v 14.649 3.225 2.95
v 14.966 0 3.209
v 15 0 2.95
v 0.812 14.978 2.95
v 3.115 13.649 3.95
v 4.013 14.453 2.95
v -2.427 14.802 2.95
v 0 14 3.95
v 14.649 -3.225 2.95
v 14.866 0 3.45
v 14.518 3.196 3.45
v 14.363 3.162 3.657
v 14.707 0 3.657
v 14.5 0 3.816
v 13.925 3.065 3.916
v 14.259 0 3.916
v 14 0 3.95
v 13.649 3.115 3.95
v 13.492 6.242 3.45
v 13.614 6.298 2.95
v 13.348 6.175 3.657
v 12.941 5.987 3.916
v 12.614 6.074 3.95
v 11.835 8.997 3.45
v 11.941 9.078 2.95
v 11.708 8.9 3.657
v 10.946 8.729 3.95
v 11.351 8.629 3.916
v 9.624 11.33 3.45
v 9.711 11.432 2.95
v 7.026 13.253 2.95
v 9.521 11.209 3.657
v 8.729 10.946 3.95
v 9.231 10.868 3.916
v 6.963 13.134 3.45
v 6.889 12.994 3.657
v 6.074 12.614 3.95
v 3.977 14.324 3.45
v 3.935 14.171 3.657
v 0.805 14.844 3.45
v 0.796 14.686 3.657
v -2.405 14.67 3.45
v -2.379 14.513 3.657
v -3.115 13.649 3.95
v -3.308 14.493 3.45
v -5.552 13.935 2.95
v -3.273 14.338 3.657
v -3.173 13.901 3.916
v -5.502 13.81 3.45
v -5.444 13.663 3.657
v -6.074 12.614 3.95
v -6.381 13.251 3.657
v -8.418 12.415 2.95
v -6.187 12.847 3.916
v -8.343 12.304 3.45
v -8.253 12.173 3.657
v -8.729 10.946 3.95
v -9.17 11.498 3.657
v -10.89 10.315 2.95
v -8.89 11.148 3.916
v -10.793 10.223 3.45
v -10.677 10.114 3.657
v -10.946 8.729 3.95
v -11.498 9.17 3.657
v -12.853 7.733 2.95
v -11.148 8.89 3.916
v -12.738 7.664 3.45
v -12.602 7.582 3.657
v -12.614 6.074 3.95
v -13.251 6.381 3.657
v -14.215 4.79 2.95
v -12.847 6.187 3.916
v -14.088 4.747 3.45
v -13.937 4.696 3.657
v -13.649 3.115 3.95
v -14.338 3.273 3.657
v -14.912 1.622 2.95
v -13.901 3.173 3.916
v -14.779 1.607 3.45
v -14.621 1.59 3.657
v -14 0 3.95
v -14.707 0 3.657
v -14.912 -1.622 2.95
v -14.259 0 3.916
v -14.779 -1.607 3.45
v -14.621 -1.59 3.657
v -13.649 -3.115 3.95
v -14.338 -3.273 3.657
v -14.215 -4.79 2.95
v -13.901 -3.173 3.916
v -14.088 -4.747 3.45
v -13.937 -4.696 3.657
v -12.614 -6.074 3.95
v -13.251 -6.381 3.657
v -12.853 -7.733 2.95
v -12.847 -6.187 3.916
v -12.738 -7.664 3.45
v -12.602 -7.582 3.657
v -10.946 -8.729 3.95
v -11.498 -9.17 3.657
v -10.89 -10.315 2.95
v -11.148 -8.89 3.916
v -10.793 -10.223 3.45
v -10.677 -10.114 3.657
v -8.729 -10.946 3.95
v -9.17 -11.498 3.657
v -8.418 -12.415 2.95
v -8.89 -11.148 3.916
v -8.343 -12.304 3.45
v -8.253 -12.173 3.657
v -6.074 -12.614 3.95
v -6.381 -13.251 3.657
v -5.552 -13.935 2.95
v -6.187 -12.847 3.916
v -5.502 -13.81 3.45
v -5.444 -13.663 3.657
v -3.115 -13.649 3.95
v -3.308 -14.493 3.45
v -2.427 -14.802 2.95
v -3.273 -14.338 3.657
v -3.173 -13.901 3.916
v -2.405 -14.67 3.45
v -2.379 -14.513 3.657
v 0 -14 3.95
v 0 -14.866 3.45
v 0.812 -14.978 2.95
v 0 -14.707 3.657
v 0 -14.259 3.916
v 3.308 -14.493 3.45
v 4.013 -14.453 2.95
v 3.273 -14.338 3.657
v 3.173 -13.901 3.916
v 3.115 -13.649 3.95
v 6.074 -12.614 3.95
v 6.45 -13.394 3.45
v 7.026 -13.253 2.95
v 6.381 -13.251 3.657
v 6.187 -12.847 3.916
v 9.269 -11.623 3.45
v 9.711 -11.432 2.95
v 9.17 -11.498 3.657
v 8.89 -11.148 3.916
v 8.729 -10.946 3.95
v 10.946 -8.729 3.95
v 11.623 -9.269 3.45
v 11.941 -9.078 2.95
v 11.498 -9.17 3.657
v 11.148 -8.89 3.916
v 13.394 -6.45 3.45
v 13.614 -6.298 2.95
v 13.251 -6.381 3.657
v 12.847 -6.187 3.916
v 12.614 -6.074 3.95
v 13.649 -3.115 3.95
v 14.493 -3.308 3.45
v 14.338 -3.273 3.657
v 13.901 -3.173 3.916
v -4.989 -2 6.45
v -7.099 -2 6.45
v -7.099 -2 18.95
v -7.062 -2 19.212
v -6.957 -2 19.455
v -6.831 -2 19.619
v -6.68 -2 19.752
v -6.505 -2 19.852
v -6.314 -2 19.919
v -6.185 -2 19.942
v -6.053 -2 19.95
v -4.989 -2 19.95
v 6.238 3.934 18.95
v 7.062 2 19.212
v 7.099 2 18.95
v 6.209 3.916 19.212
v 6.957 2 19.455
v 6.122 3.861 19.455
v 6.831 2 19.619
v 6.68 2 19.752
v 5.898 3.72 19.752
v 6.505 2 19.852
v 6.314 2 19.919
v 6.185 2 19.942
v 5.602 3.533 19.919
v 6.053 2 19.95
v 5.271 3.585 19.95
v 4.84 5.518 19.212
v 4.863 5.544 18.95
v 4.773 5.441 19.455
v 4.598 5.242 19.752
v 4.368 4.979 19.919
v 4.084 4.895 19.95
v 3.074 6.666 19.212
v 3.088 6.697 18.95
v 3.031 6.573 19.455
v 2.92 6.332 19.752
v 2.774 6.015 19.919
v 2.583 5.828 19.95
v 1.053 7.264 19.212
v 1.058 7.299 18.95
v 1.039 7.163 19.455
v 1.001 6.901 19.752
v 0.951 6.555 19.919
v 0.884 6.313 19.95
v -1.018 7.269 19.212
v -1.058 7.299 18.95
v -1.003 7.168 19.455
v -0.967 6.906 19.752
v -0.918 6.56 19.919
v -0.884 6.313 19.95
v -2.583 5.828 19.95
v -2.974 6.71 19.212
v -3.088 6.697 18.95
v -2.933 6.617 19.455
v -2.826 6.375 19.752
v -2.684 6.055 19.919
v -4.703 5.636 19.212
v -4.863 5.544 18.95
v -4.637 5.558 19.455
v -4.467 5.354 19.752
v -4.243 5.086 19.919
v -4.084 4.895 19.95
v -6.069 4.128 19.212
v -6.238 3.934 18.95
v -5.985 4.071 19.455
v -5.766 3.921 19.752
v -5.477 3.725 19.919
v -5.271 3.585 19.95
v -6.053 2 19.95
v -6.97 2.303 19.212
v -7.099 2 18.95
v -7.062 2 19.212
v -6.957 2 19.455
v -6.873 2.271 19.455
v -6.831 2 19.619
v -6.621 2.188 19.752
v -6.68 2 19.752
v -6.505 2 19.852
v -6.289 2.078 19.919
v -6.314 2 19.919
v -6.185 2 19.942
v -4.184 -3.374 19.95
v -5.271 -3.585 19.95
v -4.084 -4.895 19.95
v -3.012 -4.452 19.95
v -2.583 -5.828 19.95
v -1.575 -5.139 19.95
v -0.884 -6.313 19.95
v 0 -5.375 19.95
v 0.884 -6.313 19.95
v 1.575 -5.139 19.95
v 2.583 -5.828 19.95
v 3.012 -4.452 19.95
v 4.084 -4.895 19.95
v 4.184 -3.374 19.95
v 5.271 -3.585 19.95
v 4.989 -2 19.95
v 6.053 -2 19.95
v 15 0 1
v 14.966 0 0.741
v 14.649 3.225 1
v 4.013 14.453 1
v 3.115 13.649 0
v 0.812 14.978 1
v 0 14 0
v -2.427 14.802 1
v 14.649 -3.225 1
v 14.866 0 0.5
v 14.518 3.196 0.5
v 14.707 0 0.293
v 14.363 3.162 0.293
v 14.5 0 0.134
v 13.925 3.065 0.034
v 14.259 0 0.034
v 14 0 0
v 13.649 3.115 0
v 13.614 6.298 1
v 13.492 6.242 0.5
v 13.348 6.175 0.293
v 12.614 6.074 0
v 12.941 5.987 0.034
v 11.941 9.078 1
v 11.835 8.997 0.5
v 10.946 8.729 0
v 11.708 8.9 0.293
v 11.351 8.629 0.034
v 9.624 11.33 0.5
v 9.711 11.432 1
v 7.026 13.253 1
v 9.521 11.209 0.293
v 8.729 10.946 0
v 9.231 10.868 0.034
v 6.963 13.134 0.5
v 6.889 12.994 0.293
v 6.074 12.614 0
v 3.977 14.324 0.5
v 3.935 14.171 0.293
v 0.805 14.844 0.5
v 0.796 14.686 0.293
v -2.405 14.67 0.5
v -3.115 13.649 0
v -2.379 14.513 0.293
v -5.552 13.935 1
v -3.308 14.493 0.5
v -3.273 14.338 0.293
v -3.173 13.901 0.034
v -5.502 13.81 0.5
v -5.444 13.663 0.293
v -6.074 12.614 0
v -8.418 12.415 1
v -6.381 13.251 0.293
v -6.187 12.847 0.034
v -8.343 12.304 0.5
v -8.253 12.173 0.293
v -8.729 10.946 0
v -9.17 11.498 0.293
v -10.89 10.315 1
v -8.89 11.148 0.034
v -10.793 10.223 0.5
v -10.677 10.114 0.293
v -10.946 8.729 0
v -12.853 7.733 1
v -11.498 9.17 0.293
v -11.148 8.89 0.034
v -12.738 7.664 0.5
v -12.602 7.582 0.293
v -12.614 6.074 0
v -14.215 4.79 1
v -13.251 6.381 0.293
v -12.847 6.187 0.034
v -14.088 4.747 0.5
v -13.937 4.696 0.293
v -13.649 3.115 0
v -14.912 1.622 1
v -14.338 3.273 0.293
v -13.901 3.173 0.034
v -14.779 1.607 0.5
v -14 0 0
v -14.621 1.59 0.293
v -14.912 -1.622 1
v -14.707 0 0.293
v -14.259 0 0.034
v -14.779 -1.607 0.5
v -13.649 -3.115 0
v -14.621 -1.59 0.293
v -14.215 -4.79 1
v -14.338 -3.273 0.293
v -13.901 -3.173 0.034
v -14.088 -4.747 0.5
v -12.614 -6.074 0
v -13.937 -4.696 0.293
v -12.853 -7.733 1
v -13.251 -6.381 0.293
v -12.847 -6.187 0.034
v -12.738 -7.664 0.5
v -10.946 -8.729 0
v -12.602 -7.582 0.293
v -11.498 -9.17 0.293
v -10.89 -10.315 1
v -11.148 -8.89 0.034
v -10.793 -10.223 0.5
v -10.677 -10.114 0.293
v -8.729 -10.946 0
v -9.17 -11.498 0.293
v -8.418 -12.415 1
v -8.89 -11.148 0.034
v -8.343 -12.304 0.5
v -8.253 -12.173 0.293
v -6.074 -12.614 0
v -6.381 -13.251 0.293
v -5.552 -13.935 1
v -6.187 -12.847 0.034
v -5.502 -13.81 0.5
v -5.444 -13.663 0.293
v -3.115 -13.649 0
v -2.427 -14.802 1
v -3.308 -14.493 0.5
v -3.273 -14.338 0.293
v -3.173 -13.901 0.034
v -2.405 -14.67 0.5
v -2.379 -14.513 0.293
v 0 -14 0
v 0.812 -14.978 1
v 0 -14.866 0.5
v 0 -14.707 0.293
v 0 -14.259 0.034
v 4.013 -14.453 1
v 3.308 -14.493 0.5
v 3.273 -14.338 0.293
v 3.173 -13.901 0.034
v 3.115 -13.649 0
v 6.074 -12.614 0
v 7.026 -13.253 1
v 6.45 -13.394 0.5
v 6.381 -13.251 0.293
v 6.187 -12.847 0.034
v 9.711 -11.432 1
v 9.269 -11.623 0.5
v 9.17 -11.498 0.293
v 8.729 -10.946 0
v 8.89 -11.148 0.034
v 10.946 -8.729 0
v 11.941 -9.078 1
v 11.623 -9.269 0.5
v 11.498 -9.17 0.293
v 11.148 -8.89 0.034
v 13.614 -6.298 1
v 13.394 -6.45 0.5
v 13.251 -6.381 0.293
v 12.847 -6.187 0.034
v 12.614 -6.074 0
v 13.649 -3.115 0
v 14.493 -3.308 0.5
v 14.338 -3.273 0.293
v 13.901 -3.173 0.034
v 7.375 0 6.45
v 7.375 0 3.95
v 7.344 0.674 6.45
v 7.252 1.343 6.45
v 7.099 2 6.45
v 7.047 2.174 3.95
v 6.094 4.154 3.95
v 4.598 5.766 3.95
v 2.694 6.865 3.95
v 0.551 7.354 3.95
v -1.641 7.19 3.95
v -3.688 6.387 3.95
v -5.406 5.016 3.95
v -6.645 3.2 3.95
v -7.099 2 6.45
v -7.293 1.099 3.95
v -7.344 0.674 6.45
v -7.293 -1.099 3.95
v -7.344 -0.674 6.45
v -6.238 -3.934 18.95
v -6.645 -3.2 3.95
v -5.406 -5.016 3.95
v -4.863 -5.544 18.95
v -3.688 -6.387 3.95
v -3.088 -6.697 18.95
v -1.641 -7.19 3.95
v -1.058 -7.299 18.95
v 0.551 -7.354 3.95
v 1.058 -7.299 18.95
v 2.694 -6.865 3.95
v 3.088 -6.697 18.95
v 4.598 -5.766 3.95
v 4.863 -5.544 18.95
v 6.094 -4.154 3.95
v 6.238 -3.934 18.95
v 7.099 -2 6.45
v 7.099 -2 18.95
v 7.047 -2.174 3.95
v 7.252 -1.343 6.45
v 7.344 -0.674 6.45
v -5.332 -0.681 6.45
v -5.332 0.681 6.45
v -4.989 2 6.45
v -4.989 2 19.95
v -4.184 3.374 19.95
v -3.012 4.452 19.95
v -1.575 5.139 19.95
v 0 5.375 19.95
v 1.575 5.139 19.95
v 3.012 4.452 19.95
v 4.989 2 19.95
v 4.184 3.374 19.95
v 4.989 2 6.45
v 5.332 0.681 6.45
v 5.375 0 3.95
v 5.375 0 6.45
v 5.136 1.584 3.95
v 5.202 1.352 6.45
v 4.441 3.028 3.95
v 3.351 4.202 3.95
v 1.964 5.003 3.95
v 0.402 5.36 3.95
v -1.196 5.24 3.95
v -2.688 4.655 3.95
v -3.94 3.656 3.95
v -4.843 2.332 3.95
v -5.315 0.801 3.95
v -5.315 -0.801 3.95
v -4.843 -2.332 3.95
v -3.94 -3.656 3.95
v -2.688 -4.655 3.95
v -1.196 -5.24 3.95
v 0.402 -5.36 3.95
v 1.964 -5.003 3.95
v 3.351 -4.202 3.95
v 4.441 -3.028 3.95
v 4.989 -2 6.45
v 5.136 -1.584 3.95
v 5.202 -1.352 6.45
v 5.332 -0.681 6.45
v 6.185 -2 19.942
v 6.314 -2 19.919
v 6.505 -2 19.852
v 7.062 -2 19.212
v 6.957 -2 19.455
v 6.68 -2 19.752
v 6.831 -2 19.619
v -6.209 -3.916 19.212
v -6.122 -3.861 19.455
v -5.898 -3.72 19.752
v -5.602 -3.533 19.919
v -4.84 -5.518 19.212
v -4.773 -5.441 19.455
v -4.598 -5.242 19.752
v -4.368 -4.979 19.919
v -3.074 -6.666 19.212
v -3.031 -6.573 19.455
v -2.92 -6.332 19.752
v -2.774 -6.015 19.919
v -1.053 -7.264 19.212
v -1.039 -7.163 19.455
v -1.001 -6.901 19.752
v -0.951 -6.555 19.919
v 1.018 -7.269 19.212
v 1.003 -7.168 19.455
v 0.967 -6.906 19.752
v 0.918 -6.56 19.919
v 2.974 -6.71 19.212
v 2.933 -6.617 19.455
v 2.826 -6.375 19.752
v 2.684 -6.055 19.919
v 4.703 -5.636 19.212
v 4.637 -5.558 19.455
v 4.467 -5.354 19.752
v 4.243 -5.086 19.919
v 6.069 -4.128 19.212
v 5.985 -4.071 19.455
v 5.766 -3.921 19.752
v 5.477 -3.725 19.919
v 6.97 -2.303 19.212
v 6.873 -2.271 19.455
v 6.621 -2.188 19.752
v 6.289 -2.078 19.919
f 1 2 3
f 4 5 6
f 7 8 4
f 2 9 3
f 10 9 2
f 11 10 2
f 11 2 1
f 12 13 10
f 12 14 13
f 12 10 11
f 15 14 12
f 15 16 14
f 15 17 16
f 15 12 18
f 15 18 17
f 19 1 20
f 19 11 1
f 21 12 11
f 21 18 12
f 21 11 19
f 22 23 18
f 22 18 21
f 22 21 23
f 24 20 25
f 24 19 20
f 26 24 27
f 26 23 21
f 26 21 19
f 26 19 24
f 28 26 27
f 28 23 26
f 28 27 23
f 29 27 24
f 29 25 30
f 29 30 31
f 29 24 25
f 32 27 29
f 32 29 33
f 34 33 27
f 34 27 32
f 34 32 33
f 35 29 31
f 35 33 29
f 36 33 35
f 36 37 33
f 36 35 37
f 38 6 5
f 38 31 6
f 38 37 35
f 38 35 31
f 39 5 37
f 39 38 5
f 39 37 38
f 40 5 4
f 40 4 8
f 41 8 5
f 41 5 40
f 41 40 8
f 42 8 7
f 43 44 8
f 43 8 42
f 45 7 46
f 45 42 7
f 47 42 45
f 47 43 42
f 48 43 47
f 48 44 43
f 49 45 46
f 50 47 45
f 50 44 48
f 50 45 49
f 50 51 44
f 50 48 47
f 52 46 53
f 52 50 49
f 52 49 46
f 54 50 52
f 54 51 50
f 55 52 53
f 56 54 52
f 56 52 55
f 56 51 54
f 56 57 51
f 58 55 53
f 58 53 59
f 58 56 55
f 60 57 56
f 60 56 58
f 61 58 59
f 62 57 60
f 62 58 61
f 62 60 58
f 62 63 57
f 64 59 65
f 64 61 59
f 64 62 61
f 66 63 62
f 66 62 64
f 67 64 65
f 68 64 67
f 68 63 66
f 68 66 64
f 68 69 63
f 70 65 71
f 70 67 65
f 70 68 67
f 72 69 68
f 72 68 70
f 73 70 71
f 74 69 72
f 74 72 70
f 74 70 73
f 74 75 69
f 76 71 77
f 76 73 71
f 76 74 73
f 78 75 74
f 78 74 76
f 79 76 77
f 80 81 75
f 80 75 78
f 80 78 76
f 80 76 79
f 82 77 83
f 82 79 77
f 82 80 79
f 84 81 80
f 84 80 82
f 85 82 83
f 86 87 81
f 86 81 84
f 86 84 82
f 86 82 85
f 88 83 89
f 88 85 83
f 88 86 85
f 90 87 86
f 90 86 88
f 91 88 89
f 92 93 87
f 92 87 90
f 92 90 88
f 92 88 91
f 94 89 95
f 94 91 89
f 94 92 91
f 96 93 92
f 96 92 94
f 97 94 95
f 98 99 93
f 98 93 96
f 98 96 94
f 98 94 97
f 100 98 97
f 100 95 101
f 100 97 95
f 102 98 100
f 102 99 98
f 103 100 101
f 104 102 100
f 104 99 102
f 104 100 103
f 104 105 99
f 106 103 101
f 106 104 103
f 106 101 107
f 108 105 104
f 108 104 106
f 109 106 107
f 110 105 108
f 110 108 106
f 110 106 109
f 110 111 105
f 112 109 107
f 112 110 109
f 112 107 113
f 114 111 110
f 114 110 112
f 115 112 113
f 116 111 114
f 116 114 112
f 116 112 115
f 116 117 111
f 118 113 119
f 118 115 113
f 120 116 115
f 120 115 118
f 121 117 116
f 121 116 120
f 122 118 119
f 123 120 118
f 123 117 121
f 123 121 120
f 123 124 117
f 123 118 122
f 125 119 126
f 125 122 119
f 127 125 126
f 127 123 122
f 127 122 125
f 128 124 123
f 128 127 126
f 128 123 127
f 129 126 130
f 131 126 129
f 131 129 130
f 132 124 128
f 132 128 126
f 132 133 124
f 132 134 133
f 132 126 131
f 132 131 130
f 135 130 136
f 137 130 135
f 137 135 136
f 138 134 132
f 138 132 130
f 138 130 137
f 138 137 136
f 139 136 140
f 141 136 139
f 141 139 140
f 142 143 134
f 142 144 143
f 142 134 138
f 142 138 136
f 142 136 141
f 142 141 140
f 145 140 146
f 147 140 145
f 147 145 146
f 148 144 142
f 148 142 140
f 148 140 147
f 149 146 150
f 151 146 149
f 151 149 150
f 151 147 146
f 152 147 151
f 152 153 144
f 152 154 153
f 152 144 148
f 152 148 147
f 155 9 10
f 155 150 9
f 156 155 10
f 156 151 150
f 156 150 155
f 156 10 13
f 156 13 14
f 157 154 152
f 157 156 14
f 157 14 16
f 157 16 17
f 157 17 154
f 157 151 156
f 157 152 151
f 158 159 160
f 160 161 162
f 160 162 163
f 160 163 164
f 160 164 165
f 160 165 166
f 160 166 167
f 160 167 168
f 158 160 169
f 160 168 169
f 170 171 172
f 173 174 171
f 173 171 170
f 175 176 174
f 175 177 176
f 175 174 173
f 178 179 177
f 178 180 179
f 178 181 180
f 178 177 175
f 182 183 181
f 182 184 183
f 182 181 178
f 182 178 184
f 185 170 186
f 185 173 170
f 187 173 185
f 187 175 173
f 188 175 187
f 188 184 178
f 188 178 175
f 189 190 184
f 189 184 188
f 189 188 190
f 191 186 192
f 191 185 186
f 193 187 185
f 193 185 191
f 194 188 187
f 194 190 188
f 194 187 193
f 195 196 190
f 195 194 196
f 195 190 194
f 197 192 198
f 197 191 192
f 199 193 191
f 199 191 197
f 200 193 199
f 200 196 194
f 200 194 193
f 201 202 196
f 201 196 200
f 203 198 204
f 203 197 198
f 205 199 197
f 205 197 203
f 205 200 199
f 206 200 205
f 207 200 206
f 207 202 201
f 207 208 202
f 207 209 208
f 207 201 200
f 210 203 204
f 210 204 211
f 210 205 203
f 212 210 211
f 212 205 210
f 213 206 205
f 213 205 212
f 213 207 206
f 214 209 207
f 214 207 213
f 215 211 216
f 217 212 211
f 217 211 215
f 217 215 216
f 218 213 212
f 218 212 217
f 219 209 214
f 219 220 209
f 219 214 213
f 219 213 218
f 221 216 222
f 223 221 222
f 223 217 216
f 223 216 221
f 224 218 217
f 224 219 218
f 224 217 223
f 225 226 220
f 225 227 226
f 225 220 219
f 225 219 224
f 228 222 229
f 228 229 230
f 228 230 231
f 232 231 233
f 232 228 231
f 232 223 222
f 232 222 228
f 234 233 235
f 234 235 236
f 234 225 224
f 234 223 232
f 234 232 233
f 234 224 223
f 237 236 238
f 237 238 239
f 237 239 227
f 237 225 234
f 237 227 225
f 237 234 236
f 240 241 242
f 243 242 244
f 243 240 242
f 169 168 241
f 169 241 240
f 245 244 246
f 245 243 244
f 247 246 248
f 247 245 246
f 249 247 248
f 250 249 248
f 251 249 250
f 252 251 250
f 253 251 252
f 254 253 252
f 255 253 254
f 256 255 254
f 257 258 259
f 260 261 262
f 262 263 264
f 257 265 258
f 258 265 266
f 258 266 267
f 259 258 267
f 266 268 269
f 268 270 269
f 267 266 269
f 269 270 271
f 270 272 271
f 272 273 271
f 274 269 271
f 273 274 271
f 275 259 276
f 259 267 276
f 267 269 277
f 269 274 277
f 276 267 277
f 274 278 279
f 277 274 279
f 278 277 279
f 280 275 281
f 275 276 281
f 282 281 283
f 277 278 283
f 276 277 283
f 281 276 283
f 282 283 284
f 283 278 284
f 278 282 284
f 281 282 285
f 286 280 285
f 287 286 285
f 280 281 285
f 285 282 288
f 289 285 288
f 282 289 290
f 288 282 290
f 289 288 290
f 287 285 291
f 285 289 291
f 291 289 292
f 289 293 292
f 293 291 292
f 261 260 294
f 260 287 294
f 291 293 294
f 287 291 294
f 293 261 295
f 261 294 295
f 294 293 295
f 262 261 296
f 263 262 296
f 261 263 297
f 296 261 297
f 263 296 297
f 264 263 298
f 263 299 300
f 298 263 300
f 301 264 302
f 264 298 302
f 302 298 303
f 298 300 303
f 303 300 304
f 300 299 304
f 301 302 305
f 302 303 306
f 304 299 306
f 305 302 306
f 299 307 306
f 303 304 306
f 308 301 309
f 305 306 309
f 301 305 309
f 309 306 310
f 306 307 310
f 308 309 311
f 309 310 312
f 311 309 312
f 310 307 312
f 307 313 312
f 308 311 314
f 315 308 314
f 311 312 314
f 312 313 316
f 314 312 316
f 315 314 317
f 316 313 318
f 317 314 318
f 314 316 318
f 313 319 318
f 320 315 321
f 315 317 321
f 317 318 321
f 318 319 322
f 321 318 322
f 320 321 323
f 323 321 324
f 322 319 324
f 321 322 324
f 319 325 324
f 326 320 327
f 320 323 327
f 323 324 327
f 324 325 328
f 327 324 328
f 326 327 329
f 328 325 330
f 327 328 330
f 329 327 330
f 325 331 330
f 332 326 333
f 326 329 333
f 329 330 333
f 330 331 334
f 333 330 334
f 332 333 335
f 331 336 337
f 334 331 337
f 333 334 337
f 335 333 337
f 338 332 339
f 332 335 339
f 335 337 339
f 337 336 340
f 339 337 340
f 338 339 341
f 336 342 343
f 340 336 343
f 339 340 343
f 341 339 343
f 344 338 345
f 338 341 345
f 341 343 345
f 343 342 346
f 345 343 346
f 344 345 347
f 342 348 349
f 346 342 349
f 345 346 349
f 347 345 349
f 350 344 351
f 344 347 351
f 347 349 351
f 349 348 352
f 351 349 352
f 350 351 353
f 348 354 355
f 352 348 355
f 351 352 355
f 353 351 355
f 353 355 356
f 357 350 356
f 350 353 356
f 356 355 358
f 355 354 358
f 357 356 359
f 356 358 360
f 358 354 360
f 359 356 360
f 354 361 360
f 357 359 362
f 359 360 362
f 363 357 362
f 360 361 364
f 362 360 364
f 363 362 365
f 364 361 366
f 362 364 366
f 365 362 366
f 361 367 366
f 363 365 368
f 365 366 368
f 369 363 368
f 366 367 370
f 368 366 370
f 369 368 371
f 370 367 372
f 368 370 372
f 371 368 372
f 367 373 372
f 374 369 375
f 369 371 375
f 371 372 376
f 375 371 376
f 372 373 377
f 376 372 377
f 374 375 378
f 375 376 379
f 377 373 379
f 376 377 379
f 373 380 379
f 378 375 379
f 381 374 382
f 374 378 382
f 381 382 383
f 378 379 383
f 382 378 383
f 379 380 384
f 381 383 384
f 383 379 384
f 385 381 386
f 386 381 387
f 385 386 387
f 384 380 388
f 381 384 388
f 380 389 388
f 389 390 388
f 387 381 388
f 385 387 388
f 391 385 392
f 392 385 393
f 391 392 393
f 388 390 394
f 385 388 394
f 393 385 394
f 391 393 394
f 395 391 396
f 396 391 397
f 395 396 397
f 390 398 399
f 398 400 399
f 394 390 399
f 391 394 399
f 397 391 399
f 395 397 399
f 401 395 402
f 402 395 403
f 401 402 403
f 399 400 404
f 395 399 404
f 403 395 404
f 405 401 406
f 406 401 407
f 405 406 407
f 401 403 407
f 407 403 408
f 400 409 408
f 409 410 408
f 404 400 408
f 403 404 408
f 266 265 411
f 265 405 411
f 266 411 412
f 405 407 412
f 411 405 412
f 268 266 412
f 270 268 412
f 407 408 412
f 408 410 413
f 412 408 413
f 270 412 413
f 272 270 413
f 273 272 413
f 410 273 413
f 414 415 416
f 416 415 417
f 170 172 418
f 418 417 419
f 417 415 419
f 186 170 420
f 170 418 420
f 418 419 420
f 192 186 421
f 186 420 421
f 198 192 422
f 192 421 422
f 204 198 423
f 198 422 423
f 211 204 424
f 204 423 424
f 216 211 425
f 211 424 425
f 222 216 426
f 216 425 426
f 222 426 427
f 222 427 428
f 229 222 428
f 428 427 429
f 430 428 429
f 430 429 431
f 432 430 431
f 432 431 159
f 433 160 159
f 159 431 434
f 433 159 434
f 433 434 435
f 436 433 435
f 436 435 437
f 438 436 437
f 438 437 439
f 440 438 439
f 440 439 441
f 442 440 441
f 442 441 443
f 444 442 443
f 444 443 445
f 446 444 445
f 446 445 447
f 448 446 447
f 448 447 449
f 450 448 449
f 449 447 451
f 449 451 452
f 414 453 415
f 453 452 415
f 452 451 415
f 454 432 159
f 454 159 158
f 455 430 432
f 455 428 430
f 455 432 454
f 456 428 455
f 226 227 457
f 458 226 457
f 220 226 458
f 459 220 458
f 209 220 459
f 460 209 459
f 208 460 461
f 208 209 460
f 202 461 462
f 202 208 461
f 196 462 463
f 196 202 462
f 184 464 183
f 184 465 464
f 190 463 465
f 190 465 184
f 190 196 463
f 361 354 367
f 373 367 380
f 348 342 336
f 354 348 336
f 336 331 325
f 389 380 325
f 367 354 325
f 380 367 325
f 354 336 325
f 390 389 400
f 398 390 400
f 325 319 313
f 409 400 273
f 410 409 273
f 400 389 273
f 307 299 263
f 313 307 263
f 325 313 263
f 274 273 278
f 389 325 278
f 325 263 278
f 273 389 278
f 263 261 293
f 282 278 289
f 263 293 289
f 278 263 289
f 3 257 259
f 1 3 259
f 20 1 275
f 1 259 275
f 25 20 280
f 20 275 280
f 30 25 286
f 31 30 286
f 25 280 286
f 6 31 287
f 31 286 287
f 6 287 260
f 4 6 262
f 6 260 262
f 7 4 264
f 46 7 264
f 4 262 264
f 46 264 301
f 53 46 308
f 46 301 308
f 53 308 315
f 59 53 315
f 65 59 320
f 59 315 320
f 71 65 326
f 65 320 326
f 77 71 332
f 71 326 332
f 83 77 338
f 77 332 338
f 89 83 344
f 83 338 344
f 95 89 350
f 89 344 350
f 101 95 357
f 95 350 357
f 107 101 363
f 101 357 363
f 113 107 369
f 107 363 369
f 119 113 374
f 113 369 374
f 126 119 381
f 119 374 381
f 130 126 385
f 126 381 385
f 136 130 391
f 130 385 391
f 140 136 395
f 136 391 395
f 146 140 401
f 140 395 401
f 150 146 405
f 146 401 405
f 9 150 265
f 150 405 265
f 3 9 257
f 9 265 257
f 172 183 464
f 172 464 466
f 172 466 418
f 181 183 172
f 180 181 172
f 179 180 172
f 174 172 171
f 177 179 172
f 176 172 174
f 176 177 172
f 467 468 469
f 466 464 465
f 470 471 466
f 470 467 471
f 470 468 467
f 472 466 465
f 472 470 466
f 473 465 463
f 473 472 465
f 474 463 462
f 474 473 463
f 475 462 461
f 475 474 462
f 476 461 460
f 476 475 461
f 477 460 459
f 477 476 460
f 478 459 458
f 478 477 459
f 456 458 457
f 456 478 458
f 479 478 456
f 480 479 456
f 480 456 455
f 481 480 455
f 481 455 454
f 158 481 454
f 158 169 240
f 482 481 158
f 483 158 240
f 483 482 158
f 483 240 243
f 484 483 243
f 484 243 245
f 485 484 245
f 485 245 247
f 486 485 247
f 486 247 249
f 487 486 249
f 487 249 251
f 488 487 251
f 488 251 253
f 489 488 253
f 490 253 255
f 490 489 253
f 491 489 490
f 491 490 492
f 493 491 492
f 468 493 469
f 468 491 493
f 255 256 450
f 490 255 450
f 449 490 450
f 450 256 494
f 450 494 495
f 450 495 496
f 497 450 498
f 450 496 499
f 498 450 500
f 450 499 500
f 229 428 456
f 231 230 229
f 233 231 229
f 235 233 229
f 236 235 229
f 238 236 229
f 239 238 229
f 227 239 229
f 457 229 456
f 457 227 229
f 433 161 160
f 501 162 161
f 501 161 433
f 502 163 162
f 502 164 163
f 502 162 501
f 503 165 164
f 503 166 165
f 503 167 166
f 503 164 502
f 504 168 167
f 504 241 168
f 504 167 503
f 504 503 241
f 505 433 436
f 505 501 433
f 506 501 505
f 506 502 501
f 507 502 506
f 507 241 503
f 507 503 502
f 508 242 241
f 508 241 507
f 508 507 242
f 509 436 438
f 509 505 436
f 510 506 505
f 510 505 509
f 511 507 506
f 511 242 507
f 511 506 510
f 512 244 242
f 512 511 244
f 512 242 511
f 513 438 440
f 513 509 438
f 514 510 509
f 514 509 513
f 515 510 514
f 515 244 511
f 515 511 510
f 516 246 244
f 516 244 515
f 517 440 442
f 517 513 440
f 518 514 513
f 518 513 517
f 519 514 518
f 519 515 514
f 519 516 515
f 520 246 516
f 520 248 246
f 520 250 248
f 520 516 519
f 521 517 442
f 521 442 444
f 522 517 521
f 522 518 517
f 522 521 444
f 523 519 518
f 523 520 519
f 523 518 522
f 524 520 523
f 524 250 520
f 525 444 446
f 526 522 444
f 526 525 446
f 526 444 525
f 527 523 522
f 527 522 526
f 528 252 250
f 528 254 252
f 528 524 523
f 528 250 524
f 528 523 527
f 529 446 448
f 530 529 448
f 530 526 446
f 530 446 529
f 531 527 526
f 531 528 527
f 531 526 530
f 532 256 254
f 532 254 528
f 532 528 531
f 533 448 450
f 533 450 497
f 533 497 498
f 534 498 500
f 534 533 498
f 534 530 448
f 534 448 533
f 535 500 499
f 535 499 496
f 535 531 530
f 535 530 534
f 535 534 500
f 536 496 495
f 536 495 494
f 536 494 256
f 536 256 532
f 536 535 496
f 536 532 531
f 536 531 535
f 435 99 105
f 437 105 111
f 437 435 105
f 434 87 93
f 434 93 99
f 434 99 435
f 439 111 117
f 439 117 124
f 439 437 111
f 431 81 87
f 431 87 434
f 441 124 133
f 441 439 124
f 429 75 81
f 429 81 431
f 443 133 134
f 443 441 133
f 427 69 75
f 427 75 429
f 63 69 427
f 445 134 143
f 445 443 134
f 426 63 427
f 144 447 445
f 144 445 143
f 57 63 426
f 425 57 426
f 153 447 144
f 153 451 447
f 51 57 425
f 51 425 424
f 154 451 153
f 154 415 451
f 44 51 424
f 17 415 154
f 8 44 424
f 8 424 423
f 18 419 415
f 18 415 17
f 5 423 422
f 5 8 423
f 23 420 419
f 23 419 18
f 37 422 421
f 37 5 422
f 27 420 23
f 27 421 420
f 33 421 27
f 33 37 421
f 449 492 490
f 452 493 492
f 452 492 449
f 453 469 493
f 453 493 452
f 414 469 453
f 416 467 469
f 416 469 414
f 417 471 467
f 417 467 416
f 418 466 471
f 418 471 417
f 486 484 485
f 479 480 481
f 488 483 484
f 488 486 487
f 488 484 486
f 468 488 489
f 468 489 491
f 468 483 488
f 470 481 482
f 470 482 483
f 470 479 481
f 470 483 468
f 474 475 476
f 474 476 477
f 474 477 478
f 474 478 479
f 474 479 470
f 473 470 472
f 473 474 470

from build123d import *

# Parameters (mm, degrees)
F0_R     = 15
F1_DEPTH = 3.95
F2_R     = 7.375
F2_R_2   = 5.375
F3_DEPTH = 16
F4_W     = 23.3622987423
F4_H     = 4
F5_DEPTH = 13.5
F6_R     = 1


with BuildPart() as f1:
    # F0 (on Top) → F1 (new body)
    with BuildSketch(Plane.XY):
        Circle(F0_R)
    extrude(amount=F1_DEPTH)

    # F2 (on face) → F3 (join)
    with BuildSketch(Plane.XY.offset(3.95)):
        Circle(F2_R)
        Circle(F2_R_2, mode=Mode.SUBTRACT)
    extrude(amount=F3_DEPTH)

    # F4 (on face) → F5 (cut, through all)
    with BuildSketch(Plane.XY.offset(19.95)):
        Rectangle(F4_W, F4_H)
    extrude(amount=-F5_DEPTH, mode=Mode.SUBTRACT)

    # F6
    f6_edges = [f1.edges().sort_by_distance(p)[0] for p in [
        (0, -7.375, 19.95),
        (0, 7.375, 19.95),
        (15, 0, 1.975),
        (-15, 0, 0),
        (-15, 0, 3.95),
    ]]
    fillet(f6_edges, radius=F6_R)


solid = f1.part
